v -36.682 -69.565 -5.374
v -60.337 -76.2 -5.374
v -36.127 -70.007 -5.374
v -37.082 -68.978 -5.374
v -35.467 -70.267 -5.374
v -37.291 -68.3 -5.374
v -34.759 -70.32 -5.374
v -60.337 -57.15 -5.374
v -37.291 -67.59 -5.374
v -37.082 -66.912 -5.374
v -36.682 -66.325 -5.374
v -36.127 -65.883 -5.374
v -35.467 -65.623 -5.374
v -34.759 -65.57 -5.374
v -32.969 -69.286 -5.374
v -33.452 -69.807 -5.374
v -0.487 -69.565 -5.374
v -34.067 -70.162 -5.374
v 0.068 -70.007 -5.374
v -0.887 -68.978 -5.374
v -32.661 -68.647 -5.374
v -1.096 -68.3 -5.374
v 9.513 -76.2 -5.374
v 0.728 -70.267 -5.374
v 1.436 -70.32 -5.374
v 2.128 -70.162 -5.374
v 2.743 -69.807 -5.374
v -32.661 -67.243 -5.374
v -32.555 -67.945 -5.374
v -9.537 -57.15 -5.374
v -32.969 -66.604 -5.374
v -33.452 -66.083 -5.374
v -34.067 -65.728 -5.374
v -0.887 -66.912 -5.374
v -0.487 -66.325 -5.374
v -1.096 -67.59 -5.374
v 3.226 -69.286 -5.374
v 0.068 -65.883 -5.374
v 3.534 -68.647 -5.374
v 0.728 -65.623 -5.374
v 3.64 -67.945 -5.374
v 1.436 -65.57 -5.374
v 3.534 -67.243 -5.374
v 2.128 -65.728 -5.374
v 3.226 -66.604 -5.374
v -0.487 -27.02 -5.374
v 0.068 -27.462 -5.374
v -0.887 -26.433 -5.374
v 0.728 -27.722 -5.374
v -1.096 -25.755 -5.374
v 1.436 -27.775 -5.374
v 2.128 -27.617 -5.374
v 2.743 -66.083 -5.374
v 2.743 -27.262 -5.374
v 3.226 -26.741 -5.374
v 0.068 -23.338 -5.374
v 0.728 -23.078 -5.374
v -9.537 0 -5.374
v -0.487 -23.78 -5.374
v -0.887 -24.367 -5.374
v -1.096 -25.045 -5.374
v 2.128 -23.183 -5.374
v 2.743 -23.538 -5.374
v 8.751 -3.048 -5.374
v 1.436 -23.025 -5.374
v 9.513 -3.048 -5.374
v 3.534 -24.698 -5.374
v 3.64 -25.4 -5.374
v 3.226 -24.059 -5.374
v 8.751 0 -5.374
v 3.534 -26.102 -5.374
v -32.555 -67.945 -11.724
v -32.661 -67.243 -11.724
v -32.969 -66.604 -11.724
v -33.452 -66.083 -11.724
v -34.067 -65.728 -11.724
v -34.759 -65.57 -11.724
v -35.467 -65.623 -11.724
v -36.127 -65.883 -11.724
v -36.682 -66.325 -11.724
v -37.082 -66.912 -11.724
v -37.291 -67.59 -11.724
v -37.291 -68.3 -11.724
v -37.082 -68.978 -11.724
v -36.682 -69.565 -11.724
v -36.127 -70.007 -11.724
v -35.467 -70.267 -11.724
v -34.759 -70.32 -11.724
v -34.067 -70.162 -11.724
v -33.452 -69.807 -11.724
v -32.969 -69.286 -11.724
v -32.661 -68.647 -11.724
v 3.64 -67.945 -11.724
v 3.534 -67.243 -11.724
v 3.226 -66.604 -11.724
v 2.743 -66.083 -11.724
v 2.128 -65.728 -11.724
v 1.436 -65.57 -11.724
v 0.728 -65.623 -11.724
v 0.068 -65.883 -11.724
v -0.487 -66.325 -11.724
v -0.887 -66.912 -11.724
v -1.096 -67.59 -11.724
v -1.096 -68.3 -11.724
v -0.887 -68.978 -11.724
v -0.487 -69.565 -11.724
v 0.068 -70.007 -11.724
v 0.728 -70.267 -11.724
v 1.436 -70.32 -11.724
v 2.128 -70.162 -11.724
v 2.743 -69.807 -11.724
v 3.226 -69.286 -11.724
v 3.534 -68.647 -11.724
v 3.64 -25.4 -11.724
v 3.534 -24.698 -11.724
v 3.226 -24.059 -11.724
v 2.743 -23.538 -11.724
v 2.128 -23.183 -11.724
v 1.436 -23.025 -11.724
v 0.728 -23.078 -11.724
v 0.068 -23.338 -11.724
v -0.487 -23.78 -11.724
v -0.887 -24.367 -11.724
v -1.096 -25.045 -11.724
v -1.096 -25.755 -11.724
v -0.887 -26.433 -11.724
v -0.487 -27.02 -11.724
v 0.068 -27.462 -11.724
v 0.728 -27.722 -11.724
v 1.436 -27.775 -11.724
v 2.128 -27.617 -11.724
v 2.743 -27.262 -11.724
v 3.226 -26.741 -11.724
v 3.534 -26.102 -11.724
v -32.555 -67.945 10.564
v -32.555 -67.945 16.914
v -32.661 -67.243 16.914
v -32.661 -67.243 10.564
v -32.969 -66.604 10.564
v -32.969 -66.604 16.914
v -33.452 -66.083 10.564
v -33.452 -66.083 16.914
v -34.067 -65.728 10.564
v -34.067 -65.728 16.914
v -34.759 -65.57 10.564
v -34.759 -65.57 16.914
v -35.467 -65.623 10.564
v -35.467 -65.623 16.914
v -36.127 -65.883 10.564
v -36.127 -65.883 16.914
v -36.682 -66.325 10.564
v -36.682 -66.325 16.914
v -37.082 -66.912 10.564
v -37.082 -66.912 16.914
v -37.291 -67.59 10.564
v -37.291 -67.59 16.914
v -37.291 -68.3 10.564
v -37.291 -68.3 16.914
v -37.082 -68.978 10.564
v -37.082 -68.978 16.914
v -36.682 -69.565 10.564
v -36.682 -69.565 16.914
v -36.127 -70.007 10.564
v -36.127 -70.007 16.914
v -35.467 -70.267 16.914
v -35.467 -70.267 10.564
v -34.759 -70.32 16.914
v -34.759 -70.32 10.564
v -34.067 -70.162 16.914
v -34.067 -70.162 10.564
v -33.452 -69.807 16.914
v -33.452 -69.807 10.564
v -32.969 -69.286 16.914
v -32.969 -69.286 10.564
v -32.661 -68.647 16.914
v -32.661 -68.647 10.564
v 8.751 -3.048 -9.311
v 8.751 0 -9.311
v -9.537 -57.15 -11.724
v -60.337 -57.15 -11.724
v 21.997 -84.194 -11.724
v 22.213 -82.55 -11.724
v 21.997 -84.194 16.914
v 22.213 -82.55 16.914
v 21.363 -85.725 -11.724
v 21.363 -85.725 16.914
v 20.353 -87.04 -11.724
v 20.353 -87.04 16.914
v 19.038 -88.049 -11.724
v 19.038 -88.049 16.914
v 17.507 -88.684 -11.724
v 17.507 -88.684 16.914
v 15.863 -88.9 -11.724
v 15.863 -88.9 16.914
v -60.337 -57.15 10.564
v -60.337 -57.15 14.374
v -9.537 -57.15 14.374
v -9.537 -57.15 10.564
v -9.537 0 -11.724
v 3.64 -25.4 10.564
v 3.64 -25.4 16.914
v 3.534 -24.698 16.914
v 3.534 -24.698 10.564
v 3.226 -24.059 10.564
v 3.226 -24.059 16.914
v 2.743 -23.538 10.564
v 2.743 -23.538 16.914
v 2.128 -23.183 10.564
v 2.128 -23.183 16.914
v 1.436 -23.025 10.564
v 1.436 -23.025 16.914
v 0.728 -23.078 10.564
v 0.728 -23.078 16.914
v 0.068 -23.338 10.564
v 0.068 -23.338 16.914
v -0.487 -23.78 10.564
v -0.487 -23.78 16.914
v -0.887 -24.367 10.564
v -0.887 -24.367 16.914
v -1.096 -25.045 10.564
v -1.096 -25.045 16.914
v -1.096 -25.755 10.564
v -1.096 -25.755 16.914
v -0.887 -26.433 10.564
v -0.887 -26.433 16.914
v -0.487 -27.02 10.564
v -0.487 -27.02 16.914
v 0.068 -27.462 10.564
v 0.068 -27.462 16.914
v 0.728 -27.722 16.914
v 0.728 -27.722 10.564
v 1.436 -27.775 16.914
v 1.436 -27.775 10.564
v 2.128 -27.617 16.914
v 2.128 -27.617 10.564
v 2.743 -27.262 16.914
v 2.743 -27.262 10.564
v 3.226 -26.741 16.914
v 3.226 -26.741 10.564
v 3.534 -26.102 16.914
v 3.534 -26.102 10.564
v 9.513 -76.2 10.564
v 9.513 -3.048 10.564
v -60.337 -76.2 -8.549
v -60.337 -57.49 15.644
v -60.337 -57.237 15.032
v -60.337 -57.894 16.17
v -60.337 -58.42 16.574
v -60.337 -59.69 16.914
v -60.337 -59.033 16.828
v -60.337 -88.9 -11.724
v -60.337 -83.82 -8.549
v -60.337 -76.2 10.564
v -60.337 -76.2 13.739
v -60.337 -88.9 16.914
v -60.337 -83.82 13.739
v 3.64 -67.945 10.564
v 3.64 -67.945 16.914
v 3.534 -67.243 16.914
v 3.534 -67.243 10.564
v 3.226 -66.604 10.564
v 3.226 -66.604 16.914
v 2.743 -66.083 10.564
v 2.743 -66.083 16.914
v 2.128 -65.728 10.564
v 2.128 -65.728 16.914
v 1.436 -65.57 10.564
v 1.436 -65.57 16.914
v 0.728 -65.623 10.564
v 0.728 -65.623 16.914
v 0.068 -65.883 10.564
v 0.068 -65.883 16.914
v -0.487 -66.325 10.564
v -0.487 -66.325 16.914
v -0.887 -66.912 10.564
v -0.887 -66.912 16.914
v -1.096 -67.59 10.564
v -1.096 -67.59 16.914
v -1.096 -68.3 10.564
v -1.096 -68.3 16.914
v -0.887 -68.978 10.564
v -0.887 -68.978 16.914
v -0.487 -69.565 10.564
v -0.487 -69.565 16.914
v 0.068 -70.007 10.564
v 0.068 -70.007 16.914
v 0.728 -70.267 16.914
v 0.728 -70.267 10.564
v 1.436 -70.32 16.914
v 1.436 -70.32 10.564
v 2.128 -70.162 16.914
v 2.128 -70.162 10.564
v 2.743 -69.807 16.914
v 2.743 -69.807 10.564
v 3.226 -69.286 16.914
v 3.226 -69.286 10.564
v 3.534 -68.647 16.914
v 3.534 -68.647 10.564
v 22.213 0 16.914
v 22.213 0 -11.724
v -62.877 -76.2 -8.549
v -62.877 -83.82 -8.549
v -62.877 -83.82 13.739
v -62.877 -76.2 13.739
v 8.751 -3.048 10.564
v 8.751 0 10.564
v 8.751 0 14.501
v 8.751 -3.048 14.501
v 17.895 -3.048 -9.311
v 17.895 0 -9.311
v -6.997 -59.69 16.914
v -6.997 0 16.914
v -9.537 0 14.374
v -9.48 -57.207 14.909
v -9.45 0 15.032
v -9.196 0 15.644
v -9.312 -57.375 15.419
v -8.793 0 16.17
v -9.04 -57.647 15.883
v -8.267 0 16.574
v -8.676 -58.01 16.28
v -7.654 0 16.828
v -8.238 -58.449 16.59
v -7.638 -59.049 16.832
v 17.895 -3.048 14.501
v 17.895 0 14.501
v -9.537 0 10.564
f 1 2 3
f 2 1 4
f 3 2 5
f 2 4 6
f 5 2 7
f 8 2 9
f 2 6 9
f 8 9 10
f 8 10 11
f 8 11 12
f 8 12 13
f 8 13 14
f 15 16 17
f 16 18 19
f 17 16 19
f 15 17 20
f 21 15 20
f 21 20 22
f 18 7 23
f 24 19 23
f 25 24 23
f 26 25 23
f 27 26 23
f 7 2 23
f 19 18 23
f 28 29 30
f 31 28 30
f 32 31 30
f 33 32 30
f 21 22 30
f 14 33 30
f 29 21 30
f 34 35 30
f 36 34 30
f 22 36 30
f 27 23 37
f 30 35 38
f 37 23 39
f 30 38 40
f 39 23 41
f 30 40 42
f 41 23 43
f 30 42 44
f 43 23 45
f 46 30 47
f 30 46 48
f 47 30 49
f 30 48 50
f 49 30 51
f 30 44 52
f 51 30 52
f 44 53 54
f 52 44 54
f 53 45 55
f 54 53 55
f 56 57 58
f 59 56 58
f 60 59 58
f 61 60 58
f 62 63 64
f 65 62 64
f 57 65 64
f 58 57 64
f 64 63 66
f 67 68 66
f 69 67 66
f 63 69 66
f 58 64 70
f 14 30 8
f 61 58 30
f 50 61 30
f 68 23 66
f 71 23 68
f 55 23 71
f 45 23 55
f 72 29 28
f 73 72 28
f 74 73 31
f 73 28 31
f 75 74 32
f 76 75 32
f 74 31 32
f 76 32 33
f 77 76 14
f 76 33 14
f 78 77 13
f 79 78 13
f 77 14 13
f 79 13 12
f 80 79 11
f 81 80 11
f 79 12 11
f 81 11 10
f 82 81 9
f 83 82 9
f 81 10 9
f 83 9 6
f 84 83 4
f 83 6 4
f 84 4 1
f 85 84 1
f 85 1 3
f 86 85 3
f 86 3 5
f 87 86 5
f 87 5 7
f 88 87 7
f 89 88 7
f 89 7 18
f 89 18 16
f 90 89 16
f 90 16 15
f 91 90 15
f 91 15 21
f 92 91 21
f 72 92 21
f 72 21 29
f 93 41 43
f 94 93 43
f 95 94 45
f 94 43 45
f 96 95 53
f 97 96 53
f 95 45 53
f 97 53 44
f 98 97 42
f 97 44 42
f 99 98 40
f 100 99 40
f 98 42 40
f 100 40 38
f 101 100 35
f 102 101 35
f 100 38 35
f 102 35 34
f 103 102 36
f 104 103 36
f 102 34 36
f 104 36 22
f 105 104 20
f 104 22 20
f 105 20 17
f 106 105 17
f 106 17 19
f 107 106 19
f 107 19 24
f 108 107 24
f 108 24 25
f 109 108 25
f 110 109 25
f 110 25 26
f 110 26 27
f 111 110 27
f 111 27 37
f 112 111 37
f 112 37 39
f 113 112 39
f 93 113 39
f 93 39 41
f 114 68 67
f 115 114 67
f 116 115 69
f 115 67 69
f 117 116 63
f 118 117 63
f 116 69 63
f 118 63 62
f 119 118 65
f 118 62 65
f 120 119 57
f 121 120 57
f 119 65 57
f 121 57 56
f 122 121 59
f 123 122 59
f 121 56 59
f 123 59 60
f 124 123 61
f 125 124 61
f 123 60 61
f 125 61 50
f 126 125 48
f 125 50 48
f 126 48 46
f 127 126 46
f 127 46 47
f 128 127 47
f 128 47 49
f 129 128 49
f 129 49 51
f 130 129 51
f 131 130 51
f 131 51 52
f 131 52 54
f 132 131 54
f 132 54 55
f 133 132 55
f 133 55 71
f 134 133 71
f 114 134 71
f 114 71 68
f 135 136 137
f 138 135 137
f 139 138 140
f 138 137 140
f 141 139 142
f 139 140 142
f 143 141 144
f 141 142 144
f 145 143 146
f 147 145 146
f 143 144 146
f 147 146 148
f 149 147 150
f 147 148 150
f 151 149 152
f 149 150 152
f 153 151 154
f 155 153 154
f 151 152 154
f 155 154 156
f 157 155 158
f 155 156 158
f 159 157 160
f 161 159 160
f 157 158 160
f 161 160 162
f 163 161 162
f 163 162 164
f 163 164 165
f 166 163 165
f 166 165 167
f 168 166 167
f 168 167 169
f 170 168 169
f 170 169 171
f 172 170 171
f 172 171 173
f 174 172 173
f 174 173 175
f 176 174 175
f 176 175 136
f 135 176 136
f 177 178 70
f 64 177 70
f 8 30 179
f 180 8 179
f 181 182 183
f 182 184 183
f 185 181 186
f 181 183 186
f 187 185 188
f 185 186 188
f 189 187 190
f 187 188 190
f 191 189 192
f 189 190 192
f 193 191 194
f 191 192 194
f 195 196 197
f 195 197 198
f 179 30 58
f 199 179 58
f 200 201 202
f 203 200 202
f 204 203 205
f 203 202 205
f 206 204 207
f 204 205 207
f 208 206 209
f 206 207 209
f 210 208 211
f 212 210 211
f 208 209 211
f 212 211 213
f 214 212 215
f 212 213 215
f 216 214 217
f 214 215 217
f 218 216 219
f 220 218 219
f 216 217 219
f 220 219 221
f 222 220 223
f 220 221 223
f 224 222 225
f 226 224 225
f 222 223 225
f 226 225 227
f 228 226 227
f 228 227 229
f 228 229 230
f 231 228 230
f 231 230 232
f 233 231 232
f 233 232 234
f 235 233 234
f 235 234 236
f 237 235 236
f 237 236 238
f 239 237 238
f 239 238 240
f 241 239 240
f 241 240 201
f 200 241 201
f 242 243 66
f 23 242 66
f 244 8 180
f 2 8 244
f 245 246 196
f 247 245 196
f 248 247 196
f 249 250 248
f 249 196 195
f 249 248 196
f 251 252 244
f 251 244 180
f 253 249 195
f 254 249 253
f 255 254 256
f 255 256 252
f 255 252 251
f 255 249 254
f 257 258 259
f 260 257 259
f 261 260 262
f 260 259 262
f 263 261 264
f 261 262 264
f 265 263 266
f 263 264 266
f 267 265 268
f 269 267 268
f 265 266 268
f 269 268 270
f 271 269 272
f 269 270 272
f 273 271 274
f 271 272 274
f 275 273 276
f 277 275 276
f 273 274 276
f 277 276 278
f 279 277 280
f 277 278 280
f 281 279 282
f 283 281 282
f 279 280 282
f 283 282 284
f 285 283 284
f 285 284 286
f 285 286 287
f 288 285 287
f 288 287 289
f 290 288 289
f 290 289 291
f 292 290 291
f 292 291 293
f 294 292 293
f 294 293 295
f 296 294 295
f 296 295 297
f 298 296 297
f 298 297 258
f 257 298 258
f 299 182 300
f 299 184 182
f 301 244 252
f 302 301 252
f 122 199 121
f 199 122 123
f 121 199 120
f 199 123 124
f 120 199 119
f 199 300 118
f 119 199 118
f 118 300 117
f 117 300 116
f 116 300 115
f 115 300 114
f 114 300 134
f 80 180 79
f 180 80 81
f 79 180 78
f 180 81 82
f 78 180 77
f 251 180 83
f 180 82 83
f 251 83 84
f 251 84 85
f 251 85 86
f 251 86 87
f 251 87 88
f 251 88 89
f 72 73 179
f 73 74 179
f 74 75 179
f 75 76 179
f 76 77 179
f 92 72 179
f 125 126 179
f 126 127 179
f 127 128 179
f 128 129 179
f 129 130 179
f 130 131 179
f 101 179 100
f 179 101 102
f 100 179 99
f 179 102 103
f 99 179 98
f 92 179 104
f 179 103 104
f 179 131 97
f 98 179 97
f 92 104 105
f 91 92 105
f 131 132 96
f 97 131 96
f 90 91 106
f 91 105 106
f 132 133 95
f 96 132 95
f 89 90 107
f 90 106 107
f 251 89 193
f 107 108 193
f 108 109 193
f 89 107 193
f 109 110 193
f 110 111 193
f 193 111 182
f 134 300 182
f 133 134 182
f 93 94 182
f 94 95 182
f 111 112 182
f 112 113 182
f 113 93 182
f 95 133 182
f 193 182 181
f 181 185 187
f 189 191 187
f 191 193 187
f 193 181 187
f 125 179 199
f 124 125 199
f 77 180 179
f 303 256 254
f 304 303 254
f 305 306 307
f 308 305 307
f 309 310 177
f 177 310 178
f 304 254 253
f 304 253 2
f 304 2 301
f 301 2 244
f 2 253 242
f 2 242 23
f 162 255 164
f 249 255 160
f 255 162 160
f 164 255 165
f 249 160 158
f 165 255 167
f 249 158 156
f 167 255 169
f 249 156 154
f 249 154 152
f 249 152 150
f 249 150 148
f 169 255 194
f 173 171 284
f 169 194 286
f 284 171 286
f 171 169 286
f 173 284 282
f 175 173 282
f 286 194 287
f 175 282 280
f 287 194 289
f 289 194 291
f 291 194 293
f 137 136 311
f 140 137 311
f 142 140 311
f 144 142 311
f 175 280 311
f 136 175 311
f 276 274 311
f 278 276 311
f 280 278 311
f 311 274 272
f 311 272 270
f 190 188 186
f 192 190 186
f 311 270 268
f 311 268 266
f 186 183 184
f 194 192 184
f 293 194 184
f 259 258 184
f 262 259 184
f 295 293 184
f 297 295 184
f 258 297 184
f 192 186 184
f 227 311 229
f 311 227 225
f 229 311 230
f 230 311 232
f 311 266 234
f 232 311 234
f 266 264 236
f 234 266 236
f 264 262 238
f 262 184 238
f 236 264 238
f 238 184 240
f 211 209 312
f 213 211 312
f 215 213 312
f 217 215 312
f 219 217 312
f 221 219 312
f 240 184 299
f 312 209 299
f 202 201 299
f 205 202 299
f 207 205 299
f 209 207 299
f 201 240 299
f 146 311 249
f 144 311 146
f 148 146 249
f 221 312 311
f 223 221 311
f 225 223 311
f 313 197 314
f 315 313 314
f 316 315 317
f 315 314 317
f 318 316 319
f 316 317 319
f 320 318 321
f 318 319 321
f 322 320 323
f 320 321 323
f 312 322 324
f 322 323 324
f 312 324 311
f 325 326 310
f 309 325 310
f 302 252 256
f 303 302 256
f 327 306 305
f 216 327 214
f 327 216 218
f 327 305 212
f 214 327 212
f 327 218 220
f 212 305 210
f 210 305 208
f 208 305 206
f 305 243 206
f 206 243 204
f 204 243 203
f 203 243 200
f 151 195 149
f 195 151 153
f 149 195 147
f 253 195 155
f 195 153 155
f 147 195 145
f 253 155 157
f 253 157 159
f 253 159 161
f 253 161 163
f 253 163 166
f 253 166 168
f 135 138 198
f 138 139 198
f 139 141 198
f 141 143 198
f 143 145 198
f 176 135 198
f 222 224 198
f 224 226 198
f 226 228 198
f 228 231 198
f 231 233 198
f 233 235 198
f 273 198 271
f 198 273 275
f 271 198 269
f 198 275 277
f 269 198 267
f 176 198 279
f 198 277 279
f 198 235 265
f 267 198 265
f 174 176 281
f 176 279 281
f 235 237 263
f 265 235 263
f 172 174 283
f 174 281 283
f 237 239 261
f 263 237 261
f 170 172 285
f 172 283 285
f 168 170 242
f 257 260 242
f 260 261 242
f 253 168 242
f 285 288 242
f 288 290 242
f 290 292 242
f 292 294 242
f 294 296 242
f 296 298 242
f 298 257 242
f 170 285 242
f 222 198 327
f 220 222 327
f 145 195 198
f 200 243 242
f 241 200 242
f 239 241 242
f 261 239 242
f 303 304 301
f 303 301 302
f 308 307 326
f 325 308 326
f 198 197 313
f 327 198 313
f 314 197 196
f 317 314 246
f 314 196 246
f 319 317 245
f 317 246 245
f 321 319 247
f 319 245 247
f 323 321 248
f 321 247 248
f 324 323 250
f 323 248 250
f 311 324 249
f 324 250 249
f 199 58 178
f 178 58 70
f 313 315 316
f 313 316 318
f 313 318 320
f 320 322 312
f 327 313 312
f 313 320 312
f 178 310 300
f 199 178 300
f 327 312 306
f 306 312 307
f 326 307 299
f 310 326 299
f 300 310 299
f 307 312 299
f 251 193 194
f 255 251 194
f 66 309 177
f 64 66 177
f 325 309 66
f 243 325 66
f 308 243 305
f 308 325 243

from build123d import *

# Parameters (mm, degrees)
F1_DEPTH  = 76.2
F2_W      = 12.7
F2_H      = 28.6385
F3_DEPTH  = 31.75
F5_DEPTH  = 50.8
F6_R      = 2.54
F7_R      = 2.54
F8_R      = 6.35
F9_R      = 2.38125
F10_DEPTH = 50.8
F12_DEPTH = 2.54
F14_DEPTH = 3.048


with BuildPart() as f1:
    # F0 (on Front) → F1 (new body)
    with BuildSketch(Plane.XZ):
        Polygon((22.2132794439, -11.7242682397), (22.2132794439, 16.9142317603), (-9.5367205561, 16.9142317603), (-9.5367205561, 10.5642317603), (9.5132794439, 10.5642317603), (9.5132794439, -5.3742682397), (-9.5367205561, -5.3742682397), (-9.5367205561, -11.7242682397), align=None)
    extrude(amount=F1_DEPTH)

    # F2 (on face) → F3 (join)
    with BuildSketch(Plane.YZ.offset(22.2132794439)):
        with Locations((-82.55, 2.5949817603)):
            Rectangle(F2_W, F2_H)
    extrude(amount=-F3_DEPTH)

    # F4 (on face) → F5 (join)
    with BuildSketch(Plane(origin=(-9.5367205561, 0, 0), x_dir=(0, -1, 0), z_dir=(-1, 0, 0))):
        Polygon((88.9, -11.7242682397), (88.9, 16.9142317603), (57.15, 16.9142317603), (57.15, 10.5642317603), (76.2, 10.5642317603), (76.2, -5.3742682397), (57.15, -5.3742682397), (57.15, -11.7242682397), align=None)
    extrude(amount=F5_DEPTH)

    # F6
    f6_edges = [f1.edges().sort_by_distance(p)[0] for p in [
        (-9.536721, -28.575, 16.914232),
    ]]
    fillet(f6_edges, radius=F6_R)

    # F7
    f7_edges = [f1.edges().sort_by_distance(p)[0] for p in [
        (-34.936721, -57.15, 16.914232),
    ]]
    fillet(f7_edges, radius=F7_R)

    # F8
    f8_edges = [f1.edges().sort_by_distance(p)[0] for p in [
        (22.213279, -88.9, 2.594982),
    ]]
    fillet(f8_edges, radius=F8_R)

    # F9 (on face) → F10 (cut)
    with BuildSketch(Plane.XY.offset(16.9142317603)):
        with Locations((1.2582794439, -67.945)):
            Circle(F9_R)
        with Locations((1.2582794439, -25.4)):
            Circle(F9_R)
        with Locations((-34.9367205561, -67.945)):
            Circle(F9_R)
    extrude(amount=-F10_DEPTH, mode=Mode.SUBTRACT)

    # F11 (on face) → F12 (join)
    with BuildSketch(Plane(origin=(-60.3367205561, 0, 0), x_dir=(0, -1, 0), z_dir=(-1, 0, 0))):
        Polygon((76.2, 13.7392317603), (76.2, 10.5642317603), (76.2, -5.3742682397), (76.2, -8.5492682397), (83.82, -8.5492682397), (83.82, 13.7392317603), align=None)
    extrude(amount=F12_DEPTH)

    # F13 (on face) → F14 (cut)
    with BuildSketch(Plane(origin=(0, 0, 0), x_dir=(-1, 0, 0), z_dir=(0, 1, 0))):
        Polygon((-8.7512794439, 14.5012317603), (-9.5132794439, 14.5012317603), (-17.8952794439, 14.5012317603), (-17.8952794439, -9.3112682397), (-9.5132794439, -9.3112682397), (-8.7512794439, -9.3112682397), (-8.7512794439, -5.3742682397), (-9.5132794439, -5.3742682397), (-9.5132794439, 10.5642317603), (-8.7512794439, 10.5642317603), align=None)
    extrude(amount=-F14_DEPTH, mode=Mode.SUBTRACT)


solid = f1.part
